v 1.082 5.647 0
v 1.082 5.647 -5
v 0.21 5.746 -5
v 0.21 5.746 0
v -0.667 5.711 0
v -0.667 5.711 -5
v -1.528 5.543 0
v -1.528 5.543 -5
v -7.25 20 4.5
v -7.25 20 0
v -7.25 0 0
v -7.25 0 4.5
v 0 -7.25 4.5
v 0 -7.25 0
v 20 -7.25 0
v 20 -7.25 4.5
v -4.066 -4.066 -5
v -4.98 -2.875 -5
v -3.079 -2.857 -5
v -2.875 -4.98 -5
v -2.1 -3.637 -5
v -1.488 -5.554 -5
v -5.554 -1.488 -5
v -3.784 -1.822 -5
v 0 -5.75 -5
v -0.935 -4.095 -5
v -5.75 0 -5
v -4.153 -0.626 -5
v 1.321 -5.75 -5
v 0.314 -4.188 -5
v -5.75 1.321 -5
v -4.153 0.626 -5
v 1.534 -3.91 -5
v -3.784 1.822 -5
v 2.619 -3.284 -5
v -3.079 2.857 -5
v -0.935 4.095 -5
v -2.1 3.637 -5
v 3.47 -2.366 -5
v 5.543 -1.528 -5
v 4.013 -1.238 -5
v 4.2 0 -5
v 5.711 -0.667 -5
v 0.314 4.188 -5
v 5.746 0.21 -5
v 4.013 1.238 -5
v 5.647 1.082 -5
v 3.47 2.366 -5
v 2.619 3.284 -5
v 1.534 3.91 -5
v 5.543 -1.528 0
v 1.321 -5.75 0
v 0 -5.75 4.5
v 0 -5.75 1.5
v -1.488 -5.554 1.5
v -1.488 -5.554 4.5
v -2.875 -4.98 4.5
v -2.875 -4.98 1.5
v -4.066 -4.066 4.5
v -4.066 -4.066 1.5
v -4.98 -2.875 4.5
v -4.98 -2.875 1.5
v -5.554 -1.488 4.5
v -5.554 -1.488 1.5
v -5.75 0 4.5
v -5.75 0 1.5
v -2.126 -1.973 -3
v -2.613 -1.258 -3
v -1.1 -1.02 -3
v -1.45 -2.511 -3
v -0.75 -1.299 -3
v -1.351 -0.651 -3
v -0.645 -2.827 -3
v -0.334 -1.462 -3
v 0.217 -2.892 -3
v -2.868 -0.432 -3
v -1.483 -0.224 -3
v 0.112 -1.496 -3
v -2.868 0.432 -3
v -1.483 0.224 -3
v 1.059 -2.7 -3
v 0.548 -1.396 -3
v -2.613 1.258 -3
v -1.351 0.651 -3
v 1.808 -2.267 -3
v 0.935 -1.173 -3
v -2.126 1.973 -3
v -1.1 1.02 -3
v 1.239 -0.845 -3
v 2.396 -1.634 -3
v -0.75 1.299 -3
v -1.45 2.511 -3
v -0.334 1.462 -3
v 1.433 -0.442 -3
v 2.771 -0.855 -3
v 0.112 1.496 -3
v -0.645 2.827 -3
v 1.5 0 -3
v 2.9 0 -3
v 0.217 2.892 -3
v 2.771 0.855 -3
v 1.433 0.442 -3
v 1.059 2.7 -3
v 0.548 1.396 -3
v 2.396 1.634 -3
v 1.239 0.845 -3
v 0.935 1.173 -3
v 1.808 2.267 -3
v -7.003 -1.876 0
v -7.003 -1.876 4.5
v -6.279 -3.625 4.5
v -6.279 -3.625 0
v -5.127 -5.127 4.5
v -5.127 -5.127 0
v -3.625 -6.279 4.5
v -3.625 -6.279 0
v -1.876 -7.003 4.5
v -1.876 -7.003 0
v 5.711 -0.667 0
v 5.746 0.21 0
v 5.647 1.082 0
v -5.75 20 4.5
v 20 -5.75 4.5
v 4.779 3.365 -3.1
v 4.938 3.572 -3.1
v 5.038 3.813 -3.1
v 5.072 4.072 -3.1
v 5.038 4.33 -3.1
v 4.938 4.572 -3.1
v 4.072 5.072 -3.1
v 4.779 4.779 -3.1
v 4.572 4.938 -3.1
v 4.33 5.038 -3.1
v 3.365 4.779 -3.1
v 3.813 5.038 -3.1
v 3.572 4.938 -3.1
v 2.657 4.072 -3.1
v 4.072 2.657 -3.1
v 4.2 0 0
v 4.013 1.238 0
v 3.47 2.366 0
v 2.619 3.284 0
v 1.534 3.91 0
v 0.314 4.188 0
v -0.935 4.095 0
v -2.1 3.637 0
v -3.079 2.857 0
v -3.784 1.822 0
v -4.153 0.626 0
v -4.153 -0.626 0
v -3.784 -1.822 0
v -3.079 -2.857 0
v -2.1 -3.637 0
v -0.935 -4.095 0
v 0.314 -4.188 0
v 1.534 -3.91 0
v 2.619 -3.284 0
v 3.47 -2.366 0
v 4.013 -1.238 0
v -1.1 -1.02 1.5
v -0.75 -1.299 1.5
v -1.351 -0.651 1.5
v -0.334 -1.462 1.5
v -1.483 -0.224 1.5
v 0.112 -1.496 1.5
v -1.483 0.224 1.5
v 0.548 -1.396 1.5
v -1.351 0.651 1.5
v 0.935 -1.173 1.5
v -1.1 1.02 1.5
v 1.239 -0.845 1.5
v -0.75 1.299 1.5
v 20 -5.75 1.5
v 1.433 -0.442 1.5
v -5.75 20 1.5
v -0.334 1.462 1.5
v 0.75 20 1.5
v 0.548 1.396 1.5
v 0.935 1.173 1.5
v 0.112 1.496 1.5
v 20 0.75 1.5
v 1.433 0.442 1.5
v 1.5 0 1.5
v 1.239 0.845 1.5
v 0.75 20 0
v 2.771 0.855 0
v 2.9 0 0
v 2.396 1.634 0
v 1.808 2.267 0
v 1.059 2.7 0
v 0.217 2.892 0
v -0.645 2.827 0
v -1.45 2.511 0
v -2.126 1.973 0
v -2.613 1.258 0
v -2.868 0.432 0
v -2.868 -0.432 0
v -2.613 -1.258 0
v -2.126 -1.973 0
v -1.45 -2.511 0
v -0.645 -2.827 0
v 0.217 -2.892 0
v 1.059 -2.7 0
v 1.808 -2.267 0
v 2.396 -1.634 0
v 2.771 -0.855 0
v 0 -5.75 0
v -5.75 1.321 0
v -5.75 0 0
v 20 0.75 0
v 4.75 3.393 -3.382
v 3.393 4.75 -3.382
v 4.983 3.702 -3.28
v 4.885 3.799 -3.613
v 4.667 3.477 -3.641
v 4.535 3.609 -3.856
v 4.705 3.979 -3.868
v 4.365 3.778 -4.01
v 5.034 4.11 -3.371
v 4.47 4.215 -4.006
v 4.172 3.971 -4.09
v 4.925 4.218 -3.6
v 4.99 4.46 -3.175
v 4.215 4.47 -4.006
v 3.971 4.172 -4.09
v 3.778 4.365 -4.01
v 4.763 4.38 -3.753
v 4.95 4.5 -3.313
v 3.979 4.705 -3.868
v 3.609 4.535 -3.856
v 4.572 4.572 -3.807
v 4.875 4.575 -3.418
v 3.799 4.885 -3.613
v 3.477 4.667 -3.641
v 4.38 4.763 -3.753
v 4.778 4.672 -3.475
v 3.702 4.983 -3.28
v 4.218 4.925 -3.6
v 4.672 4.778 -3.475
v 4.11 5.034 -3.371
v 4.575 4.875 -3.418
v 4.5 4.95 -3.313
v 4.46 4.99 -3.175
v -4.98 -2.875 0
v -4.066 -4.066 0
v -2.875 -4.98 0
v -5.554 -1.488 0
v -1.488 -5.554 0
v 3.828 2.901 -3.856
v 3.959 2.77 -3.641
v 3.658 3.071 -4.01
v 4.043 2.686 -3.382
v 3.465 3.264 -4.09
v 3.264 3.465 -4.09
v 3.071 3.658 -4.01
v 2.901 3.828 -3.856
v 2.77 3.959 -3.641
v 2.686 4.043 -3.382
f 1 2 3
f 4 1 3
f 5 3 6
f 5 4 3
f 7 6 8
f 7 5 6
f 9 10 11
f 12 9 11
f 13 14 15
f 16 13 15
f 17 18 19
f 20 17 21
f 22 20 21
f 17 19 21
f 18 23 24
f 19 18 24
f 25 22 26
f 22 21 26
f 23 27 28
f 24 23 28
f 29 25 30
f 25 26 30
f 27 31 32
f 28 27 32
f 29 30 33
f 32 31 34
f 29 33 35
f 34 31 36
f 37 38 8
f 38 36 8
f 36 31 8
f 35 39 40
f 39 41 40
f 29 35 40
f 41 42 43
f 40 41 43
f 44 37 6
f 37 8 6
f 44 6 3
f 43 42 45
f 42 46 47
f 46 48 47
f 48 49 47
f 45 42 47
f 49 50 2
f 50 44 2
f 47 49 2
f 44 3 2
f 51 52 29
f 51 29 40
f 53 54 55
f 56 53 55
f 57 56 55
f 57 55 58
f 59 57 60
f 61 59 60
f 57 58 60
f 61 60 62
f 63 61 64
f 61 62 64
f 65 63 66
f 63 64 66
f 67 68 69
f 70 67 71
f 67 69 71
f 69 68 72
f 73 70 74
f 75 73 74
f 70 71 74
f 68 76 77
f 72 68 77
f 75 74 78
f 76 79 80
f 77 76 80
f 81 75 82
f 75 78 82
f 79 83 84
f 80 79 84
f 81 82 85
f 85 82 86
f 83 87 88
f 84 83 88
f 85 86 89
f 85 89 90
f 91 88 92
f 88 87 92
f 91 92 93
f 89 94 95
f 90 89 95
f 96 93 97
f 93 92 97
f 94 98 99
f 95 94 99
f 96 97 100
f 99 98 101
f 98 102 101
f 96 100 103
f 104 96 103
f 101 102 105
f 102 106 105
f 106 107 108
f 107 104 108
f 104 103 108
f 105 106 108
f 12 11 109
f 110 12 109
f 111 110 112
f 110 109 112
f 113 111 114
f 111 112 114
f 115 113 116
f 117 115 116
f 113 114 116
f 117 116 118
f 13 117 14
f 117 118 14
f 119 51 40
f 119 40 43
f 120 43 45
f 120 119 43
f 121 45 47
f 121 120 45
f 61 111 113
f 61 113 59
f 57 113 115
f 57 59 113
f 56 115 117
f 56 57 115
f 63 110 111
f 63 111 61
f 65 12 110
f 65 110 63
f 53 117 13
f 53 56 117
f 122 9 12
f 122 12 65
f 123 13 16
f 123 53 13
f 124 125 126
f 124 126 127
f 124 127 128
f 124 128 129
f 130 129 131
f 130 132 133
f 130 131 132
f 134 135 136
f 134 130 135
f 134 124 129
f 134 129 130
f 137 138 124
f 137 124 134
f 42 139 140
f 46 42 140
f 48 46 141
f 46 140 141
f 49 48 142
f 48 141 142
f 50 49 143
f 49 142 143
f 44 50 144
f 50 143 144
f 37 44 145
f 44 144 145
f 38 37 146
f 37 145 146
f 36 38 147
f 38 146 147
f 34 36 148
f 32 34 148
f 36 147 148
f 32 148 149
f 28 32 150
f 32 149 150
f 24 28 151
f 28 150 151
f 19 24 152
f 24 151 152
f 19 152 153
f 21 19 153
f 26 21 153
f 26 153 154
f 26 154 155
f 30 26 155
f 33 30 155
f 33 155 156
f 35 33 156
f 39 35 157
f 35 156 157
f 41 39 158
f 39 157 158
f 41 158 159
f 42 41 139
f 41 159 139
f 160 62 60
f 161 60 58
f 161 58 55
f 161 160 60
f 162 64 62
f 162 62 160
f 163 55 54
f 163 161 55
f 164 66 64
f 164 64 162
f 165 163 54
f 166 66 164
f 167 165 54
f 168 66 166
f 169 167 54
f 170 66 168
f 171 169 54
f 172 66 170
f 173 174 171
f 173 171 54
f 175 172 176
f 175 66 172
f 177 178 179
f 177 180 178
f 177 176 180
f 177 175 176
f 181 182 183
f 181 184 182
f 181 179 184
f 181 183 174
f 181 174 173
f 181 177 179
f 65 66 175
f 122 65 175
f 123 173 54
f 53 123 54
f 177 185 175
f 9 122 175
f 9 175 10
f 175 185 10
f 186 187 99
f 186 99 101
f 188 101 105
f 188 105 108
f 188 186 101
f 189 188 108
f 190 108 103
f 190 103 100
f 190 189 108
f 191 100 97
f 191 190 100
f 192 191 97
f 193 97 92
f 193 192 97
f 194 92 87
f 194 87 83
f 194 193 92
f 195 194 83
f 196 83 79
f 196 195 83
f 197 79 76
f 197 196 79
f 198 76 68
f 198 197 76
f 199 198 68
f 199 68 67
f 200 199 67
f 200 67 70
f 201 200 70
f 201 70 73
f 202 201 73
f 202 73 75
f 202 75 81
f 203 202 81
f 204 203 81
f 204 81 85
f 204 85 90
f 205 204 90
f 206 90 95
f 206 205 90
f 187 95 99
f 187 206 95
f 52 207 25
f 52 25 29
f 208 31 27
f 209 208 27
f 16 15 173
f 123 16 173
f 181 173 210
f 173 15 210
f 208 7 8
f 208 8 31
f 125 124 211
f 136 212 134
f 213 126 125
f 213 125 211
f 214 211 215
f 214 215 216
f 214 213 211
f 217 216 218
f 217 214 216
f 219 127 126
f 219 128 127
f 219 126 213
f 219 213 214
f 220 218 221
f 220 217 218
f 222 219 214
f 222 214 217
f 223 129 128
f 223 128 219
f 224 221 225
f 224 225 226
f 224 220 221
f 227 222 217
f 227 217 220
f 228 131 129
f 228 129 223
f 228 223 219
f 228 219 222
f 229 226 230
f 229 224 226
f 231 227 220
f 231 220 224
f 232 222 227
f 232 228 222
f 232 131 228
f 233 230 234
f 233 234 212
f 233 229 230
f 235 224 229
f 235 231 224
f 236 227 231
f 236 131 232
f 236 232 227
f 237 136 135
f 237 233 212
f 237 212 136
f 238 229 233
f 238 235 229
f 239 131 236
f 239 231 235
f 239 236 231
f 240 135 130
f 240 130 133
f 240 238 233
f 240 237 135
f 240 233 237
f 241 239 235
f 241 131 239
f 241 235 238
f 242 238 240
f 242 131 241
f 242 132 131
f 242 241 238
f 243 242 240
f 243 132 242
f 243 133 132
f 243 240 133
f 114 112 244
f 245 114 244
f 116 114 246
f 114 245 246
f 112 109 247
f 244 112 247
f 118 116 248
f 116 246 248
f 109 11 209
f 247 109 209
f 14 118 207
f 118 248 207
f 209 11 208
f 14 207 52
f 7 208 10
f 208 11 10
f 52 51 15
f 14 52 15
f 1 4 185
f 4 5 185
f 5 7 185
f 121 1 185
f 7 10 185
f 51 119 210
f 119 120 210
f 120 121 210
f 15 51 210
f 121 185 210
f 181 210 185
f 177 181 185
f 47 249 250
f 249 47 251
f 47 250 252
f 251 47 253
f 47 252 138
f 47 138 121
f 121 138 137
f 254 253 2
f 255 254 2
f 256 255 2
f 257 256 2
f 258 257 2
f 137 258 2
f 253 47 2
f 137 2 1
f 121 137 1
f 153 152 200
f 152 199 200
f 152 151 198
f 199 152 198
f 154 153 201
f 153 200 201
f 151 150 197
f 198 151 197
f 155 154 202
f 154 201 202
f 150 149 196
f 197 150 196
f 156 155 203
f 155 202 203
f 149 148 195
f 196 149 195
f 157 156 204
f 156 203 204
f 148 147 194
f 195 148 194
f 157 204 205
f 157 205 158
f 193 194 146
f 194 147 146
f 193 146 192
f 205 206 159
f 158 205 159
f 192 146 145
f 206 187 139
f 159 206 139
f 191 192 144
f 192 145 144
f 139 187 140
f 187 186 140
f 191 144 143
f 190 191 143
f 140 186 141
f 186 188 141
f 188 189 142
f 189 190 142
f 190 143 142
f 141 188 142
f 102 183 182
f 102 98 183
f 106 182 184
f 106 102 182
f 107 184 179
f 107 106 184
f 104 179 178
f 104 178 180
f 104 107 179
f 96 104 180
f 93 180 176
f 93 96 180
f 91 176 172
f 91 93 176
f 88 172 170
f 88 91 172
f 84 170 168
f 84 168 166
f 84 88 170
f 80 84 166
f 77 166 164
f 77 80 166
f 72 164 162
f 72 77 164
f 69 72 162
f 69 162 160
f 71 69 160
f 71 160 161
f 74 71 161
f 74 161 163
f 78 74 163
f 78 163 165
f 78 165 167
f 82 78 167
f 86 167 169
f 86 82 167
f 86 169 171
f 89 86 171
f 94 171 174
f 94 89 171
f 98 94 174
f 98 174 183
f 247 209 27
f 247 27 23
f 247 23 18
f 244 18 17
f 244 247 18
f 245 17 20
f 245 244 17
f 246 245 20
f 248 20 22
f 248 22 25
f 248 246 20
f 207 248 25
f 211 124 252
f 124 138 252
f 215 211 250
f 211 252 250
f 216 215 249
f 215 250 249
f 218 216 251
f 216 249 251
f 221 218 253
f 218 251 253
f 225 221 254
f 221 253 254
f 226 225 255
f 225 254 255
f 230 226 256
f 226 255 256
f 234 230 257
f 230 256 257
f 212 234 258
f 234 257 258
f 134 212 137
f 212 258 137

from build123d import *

# Parameters (mm, degrees)
F0_R      = 4.2
F0_R_2    = 2.9
F0_R_3    = 1.5
F1_DEPTH  = 1.5
F2_DEPTH  = 5
F3_DEPTH  = 3
F5_DEPTH  = 4.5
F7_W      = 1
F7_H      = 5
F8_DEPTH  = 10
F9_R      = 1
F10_DEPTH = 2
F11_R     = 1
F12_W     = 2.2280928679
F12_H     = 1.1955168769
F13_DEPTH = 3


with BuildPart() as f1:
    # F0 (on Top) → F1 (new body)
    with BuildSketch(Plane.XY):
        with BuildLine():
            Line((1.3210678119, -5.75), (5.5433312065, -1.5277366054))
            ThreePointArc((5.5433312065, -1.5277366054), (4.0658639918, 4.0658639918), (-1.5277366054, 5.5433312065))
            Line((-1.5277366054, 5.5433312065), (-5.75, 1.3210678119))
            Line((-5.75, 1.3210678119), (-5.75, 0))
            ThreePointArc((-5.75, 0), (-4.0658639918, -4.0658639918), (0, -5.75))
            Line((0, -5.75), (1.3210678119, -5.75))
        make_face()
        Circle(F0_R, mode=Mode.SUBTRACT)
        with BuildLine():
            ThreePointArc((-1.5277366054, 5.5433312065), (4.0658639918, 4.0658639918), (5.5433312065, -1.5277366054))
            Line((5.5433312065, -1.5277366054), (1.3210678119, -5.75))
            Line((1.3210678119, -5.75), (20, -5.75))
            Line((20, -5.75), (20, 0.75))
            Line((20, 0.75), (0.75, 20))
            Line((0.75, 20), (-5.75, 20))
            Line((-5.75, 20), (-5.75, 1.3210678119))
            Line((-5.75, 1.3210678119), (-1.5277366054, 5.5433312065))
        make_face()
        Circle(F0_R)
        Circle(F0_R_2, mode=Mode.SUBTRACT)
        Circle(F0_R_2)
        Circle(F0_R_3, mode=Mode.SUBTRACT)
    extrude(amount=F1_DEPTH)

    # F0 (on Top) → F2 (join)
    with BuildSketch(Plane.XY):
        with BuildLine():
            Line((1.3210678119, -5.75), (5.5433312065, -1.5277366054))
            ThreePointArc((5.5433312065, -1.5277366054), (4.0658639918, 4.0658639918), (-1.5277366054, 5.5433312065))
            Line((-1.5277366054, 5.5433312065), (-5.75, 1.3210678119))
            Line((-5.75, 1.3210678119), (-5.75, 0))
            ThreePointArc((-5.75, 0), (-4.0658639918, -4.0658639918), (0, -5.75))
            Line((0, -5.75), (1.3210678119, -5.75))
        make_face()
        Circle(F0_R, mode=Mode.SUBTRACT)
    extrude(amount=-F2_DEPTH)

    # F0 (on Top) → F3 (join)
    with BuildSketch(Plane.XY):
        Circle(F0_R_2)
        Circle(F0_R_3, mode=Mode.SUBTRACT)
    extrude(amount=-F3_DEPTH)

    # F4 (on Top) → F5 (join)
    with BuildSketch(Plane.XY):
        with BuildLine():
            ThreePointArc((0, -5.75), (-4.0658639918, -4.0658639918), (-5.75, 0))
            Line((-5.75, 0), (-5.75, 20))
            Line((-5.75, 20), (-7.25, 20))
            Line((-7.25, 20), (-7.25, 0))
            ThreePointArc((-7.25, 0), (-5.1265241636, -5.1265241636), (0, -7.25))
            Line((0, -7.25), (20, -7.25))
            Line((20, -7.25), (20, -5.75))
            Line((20, -5.75), (0, -5.75))
        make_face()
    extrude(amount=F5_DEPTH)

    # F7 (on offset) → F8 (cut)
    with BuildSketch(Plane(origin=(-3.5355339059, 3.5355339059, 0), x_dir=(-0.7071067812, -0.7071067812, 0), z_dir=(-0.7071067812, 0.7071067812, 0))):
        with Locations((-5.2581984438, -2.5)):
            Rectangle(F7_W, F7_H)
    extrude(amount=-F8_DEPTH, mode=Mode.SUBTRACT)

    # F9 (on face) → F10 (join)
    with BuildSketch(Plane(origin=(3.3645543858, 3.3645543858, 0), x_dir=(-0.7071067812, 0.7071067812, 0), z_dir=(0.7071067812, 0.7071067812, 0))):
        with Locations((0, -3.1)):
            Circle(F9_R)
    extrude(amount=F10_DEPTH)

    # F11
    f11_edges = [f1.edges().sort_by_distance(p)[0] for p in [
        (5.485875, 4.071661, -3.1),
    ]]
    fillet(f11_edges, radius=F11_R)

    # F12 (on face) → F13 (cut)
    with BuildSketch(Plane(origin=(3.3645543858, 3.3645543858, 0), x_dir=(-0.7071067812, 0.7071067812, 0), z_dir=(0.7071067812, 0.7071067812, 0))):
        with Locations((-0.035953708, -2.5022415616)):
            Rectangle(F12_W, F12_H)
    extrude(amount=F13_DEPTH, mode=Mode.SUBTRACT)


solid = f1.part
